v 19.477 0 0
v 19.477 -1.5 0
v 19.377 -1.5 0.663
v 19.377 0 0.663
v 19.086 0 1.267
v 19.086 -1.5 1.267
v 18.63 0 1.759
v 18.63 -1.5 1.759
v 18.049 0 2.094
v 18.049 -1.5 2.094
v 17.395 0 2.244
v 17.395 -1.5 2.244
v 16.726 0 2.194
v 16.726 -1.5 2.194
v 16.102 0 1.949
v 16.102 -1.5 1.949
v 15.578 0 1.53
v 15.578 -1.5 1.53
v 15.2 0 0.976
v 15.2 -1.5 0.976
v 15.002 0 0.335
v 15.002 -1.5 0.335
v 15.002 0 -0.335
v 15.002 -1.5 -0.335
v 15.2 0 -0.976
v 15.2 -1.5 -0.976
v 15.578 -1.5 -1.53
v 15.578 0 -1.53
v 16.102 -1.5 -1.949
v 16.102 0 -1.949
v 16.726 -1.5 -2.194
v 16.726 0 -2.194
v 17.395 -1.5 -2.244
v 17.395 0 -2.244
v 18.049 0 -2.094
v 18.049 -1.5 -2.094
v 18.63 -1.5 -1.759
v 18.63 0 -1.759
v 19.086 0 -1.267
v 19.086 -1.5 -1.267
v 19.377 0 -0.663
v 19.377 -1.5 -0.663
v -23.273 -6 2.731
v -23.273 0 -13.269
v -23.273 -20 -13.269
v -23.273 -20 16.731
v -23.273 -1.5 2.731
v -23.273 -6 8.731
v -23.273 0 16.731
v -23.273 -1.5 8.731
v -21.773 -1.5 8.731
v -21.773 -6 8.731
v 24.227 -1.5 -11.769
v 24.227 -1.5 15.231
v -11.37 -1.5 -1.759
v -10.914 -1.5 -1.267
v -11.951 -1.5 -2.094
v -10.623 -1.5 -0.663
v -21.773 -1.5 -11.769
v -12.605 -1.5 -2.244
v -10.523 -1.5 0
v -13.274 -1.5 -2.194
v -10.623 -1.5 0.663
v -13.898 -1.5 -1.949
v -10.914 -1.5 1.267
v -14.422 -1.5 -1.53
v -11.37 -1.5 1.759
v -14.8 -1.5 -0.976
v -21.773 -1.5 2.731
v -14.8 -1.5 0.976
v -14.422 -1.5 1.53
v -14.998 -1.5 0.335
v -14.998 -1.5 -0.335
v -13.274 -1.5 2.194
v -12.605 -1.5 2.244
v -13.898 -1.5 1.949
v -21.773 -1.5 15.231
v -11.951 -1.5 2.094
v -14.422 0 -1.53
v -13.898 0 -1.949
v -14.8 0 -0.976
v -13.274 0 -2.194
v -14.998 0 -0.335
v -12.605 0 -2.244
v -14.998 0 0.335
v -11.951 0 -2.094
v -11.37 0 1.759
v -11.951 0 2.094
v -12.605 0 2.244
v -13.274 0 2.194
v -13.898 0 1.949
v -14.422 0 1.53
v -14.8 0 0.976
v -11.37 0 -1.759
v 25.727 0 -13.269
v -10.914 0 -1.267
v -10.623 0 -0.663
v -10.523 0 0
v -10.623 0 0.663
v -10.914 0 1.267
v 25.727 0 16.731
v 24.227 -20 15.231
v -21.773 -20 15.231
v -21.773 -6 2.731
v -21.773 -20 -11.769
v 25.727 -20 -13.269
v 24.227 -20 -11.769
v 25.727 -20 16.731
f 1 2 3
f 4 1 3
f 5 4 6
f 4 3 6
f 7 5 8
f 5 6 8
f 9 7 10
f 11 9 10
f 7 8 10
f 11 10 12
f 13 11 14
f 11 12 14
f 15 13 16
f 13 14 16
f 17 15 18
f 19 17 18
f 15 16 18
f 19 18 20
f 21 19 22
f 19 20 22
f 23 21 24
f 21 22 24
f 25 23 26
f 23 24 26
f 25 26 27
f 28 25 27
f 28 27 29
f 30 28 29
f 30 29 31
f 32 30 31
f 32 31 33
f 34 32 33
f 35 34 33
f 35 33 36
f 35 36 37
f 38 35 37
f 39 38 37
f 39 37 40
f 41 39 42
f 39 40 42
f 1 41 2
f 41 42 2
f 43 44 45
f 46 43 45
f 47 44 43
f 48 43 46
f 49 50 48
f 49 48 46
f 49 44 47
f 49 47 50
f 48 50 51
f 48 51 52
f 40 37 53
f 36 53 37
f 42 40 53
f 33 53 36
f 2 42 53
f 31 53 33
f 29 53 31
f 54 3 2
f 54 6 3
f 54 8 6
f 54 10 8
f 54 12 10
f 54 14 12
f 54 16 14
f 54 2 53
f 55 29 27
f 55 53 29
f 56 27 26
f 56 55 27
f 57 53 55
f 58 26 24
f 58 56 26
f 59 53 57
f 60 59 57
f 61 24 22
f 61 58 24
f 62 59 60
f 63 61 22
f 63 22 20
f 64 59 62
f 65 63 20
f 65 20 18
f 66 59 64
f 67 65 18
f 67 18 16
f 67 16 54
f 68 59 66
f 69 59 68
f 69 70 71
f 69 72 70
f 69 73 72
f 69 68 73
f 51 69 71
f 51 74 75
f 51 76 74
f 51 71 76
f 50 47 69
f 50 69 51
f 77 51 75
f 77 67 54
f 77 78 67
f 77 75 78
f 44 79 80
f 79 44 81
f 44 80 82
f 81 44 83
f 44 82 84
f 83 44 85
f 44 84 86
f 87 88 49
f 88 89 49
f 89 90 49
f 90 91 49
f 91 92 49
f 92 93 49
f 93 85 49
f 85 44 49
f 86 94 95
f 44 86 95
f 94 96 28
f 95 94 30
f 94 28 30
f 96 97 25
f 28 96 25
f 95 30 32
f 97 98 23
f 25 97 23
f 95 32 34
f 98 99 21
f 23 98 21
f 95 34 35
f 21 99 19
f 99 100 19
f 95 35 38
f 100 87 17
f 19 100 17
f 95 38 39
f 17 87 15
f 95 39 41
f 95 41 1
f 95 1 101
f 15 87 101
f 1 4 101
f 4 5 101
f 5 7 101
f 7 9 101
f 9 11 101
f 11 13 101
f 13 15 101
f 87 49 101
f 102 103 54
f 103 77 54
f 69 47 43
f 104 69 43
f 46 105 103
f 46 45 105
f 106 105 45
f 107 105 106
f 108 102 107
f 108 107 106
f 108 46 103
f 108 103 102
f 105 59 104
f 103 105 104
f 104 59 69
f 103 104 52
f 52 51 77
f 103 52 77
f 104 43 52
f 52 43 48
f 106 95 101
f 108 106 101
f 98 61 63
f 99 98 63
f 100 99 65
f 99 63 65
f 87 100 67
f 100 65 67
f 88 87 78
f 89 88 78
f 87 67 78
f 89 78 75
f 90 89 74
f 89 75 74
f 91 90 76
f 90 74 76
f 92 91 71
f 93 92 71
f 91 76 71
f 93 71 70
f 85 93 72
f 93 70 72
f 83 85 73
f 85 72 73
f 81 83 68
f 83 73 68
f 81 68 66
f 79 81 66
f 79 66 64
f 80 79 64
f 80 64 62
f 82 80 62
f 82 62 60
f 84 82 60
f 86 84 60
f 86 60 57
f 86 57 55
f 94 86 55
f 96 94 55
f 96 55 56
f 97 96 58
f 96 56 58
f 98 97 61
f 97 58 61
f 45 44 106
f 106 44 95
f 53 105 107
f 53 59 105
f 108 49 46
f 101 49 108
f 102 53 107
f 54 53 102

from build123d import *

# Parameters (mm, degrees)
F0_W     = 49
F0_H     = 30
F1_DEPTH = 20
F2_T     = -1.5
F3_R     = 2.25
F4_DEPTH = 1.5
F5_W     = 4.5
F5_H     = 6
F6_DEPTH = 1.5


with BuildPart() as f1:
    # F0 (on Front) → F1 (new body)
    with BuildSketch(Plane.XZ):
        with Locations((1.226867, 1.730894)):
            Rectangle(F0_W, F0_H)
    extrude(amount=F1_DEPTH)

    # F2
    f2_openings = [f1.faces().sort_by_distance(p)[0] for p in [
        (1.226867, -20, 1.730894),
    ]]
    offset(amount=F2_T, openings=f2_openings)

    # F3 (on face) → F4 (cut, through all)
    with BuildSketch(Plane.XZ.offset(1.5)):
        with Locations((-12.773133, 0)):
            Circle(F3_R)
        with Locations((17.226867, 0)):
            Circle(F3_R)
    extrude(amount=-F4_DEPTH, mode=Mode.SUBTRACT)

    # F5 (on face) → F6 (cut, through all)
    with BuildSketch(Plane(origin=(-23.273133, 0, 0), x_dir=(0, -1, 0), z_dir=(-1, 0, 0))):
        with Locations((3.75, 5.730894)):
            Rectangle(F5_W, F5_H)
    extrude(amount=-F6_DEPTH, mode=Mode.SUBTRACT)


solid = f1.part
